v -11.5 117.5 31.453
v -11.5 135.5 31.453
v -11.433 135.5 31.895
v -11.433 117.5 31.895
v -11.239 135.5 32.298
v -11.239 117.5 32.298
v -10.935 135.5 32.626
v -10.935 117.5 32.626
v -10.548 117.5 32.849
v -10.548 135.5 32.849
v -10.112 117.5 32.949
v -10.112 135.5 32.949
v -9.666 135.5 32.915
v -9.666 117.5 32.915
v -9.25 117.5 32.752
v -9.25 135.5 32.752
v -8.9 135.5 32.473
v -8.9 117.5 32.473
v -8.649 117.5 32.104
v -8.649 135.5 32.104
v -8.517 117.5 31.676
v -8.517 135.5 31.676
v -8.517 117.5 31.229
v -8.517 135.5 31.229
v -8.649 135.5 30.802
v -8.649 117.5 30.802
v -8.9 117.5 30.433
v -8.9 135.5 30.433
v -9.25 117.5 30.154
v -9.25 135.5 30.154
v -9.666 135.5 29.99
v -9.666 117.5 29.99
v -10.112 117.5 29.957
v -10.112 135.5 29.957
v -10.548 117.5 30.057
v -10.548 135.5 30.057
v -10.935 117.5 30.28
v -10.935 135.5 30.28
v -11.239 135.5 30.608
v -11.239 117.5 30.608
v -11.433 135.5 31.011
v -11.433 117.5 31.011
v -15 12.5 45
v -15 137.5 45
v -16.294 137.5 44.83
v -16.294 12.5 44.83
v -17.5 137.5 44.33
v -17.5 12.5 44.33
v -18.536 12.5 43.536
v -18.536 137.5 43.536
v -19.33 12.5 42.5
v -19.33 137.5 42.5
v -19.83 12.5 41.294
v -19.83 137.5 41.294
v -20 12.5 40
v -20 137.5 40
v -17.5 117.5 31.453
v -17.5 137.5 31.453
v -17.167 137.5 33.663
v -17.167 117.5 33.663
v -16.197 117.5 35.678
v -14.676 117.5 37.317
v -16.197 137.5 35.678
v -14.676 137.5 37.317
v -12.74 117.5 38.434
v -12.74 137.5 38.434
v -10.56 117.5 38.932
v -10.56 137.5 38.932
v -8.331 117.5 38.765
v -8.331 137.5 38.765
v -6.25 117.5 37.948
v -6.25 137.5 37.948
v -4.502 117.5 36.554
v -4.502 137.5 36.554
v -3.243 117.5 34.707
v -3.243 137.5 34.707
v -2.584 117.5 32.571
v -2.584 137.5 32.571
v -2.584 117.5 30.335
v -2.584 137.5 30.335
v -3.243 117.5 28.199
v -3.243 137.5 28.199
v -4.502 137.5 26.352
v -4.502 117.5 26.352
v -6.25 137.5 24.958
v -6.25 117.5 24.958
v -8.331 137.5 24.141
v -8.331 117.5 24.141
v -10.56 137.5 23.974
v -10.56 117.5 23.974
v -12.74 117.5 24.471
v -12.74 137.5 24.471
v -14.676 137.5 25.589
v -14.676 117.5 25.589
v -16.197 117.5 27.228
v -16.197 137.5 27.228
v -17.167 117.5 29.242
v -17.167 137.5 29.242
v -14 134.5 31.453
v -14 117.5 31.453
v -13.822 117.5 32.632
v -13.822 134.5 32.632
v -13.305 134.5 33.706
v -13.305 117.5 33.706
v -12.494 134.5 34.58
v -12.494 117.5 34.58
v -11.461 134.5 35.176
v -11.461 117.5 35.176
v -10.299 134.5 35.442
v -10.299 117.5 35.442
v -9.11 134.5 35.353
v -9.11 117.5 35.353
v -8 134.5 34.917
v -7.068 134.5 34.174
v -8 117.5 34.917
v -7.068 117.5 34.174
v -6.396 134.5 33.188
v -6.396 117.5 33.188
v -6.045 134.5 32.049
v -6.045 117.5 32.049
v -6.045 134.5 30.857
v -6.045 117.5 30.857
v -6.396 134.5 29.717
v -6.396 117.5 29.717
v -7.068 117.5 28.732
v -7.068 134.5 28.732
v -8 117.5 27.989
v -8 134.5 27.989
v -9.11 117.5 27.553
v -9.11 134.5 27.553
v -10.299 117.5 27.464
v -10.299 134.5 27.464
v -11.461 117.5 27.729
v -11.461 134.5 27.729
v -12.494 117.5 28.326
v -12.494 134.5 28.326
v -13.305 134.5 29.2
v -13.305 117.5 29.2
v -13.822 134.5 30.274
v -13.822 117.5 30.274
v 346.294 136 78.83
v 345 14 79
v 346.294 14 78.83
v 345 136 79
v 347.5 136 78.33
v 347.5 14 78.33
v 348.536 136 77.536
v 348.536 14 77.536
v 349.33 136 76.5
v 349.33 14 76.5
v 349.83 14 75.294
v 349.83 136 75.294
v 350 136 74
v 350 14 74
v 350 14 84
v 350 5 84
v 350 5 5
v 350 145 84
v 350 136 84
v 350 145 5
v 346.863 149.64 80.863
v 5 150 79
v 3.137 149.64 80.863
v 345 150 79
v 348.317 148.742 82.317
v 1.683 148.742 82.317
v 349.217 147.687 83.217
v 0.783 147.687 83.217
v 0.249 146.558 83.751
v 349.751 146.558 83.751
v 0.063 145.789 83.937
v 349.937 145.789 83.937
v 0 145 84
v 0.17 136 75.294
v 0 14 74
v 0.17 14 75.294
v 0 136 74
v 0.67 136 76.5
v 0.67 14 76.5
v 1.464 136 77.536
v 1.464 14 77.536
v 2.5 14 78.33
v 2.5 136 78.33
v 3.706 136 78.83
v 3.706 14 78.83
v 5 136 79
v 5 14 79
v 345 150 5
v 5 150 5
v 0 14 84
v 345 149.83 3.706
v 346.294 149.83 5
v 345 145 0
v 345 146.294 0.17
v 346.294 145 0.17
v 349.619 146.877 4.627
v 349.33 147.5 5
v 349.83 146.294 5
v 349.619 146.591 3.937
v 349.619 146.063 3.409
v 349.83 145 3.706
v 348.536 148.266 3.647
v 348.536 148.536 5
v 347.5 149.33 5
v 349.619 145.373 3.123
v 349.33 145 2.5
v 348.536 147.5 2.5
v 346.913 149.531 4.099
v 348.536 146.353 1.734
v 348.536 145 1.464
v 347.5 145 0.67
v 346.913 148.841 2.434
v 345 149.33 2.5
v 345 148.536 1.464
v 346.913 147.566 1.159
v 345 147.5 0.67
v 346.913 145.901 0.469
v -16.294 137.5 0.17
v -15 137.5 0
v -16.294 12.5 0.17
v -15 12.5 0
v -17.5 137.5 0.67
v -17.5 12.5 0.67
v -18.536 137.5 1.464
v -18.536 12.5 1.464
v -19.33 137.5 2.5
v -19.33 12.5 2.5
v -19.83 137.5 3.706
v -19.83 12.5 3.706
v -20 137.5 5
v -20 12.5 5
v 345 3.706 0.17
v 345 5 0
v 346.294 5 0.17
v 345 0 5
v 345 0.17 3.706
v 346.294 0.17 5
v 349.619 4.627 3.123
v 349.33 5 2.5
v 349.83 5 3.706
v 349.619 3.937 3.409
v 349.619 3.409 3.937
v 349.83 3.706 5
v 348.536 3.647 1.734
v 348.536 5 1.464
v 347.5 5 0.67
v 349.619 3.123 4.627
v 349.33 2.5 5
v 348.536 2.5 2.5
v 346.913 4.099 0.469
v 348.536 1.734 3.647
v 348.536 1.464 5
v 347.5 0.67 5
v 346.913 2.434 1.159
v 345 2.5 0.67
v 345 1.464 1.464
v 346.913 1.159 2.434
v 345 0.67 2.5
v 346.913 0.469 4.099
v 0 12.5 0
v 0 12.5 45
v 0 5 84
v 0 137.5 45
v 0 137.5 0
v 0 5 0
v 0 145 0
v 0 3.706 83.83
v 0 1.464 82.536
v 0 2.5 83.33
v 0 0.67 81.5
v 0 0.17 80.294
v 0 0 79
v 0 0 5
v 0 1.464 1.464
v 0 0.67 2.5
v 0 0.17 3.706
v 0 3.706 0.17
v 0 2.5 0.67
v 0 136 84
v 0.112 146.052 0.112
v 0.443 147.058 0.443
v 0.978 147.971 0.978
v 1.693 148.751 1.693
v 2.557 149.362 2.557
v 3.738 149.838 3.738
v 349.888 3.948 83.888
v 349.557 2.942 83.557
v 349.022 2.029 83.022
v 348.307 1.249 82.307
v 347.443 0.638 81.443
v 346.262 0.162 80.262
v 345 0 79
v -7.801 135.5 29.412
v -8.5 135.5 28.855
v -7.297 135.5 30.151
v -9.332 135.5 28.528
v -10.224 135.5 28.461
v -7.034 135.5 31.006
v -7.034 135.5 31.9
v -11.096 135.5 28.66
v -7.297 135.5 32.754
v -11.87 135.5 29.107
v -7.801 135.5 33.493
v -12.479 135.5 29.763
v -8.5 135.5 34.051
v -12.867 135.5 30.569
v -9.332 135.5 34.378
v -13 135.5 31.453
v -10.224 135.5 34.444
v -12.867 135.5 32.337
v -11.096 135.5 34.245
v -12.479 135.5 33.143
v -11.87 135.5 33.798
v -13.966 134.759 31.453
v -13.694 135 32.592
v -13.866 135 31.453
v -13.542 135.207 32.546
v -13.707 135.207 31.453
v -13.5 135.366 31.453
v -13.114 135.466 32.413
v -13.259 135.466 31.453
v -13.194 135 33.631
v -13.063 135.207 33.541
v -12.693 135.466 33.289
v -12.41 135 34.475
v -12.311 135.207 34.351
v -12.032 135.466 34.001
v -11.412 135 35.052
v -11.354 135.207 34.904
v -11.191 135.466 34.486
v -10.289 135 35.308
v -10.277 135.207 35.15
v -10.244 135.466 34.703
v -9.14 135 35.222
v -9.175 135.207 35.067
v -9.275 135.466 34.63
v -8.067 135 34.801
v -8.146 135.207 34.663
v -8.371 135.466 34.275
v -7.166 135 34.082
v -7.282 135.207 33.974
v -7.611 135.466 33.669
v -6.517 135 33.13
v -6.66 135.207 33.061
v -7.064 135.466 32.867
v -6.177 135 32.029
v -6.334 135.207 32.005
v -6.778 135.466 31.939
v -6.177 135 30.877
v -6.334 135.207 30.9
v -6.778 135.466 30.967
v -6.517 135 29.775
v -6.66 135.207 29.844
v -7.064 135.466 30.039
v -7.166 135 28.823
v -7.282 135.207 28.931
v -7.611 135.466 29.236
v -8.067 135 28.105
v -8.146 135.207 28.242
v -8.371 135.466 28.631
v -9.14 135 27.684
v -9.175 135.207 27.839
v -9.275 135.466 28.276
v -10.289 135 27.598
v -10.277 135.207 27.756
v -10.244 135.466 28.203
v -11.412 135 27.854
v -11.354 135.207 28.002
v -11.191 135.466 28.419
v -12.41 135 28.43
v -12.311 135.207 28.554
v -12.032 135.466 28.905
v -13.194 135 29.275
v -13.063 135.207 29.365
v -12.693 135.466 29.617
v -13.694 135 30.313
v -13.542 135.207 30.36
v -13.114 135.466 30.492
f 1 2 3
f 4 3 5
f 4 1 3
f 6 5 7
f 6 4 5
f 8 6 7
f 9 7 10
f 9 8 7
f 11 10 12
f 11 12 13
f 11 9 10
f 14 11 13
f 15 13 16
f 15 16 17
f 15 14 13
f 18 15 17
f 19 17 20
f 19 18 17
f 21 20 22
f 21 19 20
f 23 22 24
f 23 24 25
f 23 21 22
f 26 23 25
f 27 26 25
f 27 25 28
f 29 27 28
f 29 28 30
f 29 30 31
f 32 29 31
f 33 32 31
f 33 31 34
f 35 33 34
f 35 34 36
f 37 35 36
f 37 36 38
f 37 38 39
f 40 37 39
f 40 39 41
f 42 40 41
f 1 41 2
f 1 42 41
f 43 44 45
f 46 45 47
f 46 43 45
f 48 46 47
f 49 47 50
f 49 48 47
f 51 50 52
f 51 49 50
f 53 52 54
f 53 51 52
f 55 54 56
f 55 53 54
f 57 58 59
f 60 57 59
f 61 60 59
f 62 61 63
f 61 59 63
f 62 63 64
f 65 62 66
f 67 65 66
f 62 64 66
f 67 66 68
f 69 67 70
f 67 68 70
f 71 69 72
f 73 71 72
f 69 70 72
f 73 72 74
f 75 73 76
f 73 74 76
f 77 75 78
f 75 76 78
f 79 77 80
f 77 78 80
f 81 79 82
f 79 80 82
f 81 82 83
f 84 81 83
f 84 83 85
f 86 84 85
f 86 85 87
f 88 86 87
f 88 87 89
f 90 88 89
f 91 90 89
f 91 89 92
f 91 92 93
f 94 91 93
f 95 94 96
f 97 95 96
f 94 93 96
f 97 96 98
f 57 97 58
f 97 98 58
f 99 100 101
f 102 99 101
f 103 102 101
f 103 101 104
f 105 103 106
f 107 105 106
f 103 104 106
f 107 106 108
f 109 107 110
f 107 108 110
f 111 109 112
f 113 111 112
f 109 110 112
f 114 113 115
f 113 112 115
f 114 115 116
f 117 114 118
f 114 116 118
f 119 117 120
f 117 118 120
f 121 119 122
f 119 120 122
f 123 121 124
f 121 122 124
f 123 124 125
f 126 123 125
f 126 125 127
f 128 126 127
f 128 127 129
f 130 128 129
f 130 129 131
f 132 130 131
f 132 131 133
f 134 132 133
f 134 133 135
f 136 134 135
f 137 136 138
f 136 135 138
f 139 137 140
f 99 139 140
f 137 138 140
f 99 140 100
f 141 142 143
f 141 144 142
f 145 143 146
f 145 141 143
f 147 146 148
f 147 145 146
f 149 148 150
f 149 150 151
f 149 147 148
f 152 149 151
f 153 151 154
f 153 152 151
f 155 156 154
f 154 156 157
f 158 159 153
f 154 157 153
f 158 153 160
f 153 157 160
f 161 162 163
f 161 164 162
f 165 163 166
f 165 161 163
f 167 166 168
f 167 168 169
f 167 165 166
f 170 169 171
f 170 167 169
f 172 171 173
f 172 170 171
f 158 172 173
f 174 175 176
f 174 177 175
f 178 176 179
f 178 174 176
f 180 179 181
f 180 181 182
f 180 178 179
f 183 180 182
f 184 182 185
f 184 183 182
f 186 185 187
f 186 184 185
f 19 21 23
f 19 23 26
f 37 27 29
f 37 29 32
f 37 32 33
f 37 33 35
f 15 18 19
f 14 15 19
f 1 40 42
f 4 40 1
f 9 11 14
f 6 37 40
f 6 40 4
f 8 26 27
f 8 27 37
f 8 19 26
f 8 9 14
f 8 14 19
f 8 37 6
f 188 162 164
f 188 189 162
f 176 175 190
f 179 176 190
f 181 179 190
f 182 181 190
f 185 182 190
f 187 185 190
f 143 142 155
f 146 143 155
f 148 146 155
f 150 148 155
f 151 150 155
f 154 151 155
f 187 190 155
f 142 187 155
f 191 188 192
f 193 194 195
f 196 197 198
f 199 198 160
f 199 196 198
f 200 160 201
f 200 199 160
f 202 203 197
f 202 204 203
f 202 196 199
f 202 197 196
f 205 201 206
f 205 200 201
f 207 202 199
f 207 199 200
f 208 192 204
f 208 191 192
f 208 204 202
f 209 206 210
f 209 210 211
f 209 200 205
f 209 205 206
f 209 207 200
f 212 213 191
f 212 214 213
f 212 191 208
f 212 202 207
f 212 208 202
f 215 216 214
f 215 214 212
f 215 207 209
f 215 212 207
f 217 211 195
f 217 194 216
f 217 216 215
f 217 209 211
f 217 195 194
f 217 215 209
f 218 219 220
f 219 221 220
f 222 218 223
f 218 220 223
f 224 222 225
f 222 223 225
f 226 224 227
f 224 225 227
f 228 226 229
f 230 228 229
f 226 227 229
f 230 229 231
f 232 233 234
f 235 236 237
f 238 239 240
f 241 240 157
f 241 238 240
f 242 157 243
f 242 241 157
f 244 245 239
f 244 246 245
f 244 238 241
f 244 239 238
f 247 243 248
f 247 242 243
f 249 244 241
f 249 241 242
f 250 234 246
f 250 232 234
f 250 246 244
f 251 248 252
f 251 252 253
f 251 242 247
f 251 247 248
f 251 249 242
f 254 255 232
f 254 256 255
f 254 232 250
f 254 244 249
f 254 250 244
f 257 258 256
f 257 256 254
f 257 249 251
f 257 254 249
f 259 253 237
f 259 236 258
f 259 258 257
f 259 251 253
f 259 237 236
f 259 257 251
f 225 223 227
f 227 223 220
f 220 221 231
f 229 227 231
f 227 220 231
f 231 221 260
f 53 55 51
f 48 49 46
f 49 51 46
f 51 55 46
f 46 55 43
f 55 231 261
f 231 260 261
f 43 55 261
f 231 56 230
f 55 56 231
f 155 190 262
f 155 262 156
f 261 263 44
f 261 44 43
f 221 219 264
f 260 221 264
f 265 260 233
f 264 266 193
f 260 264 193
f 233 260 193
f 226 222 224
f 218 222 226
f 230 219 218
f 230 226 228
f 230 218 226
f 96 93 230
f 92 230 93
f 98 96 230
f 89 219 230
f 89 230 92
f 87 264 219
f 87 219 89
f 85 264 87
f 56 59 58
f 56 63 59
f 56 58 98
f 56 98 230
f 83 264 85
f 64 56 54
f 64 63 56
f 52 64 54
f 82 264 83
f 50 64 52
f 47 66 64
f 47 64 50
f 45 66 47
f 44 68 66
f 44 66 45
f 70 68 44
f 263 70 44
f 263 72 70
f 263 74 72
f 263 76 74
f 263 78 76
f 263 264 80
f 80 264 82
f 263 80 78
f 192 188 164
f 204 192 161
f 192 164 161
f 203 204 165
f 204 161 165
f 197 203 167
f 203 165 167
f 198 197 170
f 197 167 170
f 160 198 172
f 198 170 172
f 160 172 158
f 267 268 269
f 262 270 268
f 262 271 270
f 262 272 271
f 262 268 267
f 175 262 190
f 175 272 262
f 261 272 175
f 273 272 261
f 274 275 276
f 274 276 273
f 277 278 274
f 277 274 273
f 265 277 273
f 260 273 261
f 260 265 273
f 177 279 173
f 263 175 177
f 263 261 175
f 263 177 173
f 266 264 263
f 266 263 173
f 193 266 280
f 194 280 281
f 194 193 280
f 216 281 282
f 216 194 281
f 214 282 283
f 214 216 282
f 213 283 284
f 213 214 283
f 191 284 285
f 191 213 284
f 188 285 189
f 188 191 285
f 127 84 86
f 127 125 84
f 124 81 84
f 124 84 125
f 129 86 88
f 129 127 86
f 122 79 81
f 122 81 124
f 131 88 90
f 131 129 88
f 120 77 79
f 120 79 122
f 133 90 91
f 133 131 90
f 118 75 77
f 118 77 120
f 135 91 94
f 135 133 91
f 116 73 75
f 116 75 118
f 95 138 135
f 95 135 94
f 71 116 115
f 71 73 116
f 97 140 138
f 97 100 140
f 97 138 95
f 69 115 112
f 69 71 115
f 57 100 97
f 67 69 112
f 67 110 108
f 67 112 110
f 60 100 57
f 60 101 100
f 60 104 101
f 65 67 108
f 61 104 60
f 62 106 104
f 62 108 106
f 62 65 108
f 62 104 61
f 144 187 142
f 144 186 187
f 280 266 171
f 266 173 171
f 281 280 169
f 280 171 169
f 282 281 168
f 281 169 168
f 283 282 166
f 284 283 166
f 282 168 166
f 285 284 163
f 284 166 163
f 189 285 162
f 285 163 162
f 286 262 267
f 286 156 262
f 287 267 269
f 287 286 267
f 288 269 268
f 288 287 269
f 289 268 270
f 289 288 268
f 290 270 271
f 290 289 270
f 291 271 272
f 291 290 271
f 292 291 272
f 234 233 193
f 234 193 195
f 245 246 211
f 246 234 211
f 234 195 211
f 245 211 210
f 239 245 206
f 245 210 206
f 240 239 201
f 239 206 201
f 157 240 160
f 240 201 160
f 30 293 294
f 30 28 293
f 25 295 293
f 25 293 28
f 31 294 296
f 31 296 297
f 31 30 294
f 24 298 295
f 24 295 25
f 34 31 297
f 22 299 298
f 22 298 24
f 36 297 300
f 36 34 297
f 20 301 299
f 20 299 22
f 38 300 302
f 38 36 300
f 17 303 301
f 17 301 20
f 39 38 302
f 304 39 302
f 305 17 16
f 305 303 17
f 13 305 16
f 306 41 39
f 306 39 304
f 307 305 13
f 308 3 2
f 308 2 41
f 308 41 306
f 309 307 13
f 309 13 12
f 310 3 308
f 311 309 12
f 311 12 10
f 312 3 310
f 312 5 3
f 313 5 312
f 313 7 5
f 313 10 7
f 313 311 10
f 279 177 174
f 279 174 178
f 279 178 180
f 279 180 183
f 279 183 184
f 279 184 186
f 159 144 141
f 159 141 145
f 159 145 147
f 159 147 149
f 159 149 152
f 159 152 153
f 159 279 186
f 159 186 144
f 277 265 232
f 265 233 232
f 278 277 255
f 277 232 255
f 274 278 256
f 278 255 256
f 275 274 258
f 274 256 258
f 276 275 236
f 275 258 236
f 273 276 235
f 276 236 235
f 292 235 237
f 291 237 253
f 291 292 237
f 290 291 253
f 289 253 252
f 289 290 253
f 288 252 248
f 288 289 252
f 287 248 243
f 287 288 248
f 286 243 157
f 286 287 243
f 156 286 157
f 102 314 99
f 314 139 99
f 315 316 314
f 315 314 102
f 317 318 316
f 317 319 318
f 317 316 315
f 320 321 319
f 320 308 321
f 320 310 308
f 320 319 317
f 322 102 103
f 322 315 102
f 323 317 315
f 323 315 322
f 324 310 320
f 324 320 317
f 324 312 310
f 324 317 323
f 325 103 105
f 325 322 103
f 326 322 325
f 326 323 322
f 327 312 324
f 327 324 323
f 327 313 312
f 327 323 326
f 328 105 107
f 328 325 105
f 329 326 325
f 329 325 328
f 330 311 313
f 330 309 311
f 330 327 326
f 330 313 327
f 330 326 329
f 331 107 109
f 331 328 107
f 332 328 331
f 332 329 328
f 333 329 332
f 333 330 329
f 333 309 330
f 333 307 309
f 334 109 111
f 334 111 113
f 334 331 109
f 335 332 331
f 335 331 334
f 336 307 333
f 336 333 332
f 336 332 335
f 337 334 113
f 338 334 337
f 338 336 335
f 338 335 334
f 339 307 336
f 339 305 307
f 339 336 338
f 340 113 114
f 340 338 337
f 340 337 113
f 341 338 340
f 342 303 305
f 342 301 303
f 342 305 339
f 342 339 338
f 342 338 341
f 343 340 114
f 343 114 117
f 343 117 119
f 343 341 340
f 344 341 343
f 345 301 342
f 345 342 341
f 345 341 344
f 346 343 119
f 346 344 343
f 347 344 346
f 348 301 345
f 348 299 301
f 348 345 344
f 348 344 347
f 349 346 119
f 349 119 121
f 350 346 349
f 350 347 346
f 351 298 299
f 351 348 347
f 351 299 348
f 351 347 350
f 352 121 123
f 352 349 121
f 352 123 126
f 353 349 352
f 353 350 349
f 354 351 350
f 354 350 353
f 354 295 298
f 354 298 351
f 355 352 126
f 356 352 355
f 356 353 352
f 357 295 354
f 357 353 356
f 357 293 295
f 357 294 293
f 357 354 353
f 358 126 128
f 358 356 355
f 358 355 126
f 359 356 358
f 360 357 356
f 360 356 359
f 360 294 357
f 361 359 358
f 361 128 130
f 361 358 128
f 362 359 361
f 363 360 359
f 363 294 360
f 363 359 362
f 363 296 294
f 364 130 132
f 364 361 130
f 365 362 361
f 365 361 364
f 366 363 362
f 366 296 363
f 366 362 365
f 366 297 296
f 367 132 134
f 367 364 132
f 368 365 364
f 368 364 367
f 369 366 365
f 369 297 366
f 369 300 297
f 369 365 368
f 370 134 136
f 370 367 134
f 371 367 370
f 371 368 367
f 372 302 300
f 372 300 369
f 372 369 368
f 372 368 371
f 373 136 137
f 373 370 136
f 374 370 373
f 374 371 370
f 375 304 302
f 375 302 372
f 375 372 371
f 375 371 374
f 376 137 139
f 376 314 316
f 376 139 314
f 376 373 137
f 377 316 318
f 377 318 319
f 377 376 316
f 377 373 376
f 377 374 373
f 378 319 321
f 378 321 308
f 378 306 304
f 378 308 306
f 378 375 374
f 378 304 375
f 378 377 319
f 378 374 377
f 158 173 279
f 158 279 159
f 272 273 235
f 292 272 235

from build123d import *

# Parameters (mm, degrees)
F0_W     = 350
F0_H     = 150
F1_DEPTH = 84
F2_W     = 350
F2_H     = 122
F3_DEPTH = 5
F4_W     = 125
F4_H     = 45
F5_DEPTH = 20
F6_R     = 7.5
F7_DEPTH = 20
F8_R     = 4
F8_R_2   = 1.5
F9_DEPTH = 18
F10_R    = 5
F11_R    = 1


with BuildPart() as f1:
    # F0 (on Top) → F1 (new body)
    with BuildSketch(Plane.XY):
        with Locations((175, 75)):
            Rectangle(F0_W, F0_H)
    extrude(amount=F1_DEPTH)

    # F2 (on face) → F3 (cut)
    with BuildSketch(Plane.XY.offset(84)):
        with Locations((175, 75)):
            Rectangle(F2_W, F2_H)
    extrude(amount=-F3_DEPTH, mode=Mode.SUBTRACT)

    # F4 (on face) → F5 (join)
    with BuildSketch(Plane(origin=(0, 0, 0), x_dir=(0, -1, 0), z_dir=(-1, 0, 0))):
        with Locations((-75, 22.5)):
            Rectangle(F4_W, F4_H)
    extrude(amount=F5_DEPTH)

    # F6 (on face) → F7 (cut)
    with BuildSketch(Plane(origin=(0, 137.5, 0), x_dir=(-1, 0, 0), z_dir=(0, 1, 0))):
        with Locations((10, 31.452831)):
            Circle(F6_R)
    extrude(amount=-F7_DEPTH, mode=Mode.SUBTRACT)

    # F8 (on face) → F9 (join)
    with BuildSketch(Plane(origin=(0, 117.5, 0), x_dir=(-1, 0, 0), z_dir=(0, 1, 0))):
        with Locations((10, 31.452831)):
            Circle(F8_R)
        with Locations((10, 31.452831)):
            Circle(F8_R_2, mode=Mode.SUBTRACT)
    extrude(amount=F9_DEPTH)

    # F10
    f10_edges = [f1.edges().sort_by_distance(p)[0] for p in [
        (175, 150, 84),
        (175, 150, 0),
        (175, 0, 84),
        (175, 0, 0),
        (350, 150, 42),
        (350, 75, 0),
        (350, 75, 79),
        (350, 0, 42),
        (0, 75, 79),
        (0, 150, 42),
        (-20, 75, 45),
        (-20, 75, 0),
    ]]
    fillet(f10_edges, radius=F10_R)

    # F11
    f11_edges = [f1.edges().sort_by_distance(p)[0] for p in [
        (-6, 135.5, 31.452831),
    ]]
    fillet(f11_edges, radius=F11_R)


solid = f1.part
